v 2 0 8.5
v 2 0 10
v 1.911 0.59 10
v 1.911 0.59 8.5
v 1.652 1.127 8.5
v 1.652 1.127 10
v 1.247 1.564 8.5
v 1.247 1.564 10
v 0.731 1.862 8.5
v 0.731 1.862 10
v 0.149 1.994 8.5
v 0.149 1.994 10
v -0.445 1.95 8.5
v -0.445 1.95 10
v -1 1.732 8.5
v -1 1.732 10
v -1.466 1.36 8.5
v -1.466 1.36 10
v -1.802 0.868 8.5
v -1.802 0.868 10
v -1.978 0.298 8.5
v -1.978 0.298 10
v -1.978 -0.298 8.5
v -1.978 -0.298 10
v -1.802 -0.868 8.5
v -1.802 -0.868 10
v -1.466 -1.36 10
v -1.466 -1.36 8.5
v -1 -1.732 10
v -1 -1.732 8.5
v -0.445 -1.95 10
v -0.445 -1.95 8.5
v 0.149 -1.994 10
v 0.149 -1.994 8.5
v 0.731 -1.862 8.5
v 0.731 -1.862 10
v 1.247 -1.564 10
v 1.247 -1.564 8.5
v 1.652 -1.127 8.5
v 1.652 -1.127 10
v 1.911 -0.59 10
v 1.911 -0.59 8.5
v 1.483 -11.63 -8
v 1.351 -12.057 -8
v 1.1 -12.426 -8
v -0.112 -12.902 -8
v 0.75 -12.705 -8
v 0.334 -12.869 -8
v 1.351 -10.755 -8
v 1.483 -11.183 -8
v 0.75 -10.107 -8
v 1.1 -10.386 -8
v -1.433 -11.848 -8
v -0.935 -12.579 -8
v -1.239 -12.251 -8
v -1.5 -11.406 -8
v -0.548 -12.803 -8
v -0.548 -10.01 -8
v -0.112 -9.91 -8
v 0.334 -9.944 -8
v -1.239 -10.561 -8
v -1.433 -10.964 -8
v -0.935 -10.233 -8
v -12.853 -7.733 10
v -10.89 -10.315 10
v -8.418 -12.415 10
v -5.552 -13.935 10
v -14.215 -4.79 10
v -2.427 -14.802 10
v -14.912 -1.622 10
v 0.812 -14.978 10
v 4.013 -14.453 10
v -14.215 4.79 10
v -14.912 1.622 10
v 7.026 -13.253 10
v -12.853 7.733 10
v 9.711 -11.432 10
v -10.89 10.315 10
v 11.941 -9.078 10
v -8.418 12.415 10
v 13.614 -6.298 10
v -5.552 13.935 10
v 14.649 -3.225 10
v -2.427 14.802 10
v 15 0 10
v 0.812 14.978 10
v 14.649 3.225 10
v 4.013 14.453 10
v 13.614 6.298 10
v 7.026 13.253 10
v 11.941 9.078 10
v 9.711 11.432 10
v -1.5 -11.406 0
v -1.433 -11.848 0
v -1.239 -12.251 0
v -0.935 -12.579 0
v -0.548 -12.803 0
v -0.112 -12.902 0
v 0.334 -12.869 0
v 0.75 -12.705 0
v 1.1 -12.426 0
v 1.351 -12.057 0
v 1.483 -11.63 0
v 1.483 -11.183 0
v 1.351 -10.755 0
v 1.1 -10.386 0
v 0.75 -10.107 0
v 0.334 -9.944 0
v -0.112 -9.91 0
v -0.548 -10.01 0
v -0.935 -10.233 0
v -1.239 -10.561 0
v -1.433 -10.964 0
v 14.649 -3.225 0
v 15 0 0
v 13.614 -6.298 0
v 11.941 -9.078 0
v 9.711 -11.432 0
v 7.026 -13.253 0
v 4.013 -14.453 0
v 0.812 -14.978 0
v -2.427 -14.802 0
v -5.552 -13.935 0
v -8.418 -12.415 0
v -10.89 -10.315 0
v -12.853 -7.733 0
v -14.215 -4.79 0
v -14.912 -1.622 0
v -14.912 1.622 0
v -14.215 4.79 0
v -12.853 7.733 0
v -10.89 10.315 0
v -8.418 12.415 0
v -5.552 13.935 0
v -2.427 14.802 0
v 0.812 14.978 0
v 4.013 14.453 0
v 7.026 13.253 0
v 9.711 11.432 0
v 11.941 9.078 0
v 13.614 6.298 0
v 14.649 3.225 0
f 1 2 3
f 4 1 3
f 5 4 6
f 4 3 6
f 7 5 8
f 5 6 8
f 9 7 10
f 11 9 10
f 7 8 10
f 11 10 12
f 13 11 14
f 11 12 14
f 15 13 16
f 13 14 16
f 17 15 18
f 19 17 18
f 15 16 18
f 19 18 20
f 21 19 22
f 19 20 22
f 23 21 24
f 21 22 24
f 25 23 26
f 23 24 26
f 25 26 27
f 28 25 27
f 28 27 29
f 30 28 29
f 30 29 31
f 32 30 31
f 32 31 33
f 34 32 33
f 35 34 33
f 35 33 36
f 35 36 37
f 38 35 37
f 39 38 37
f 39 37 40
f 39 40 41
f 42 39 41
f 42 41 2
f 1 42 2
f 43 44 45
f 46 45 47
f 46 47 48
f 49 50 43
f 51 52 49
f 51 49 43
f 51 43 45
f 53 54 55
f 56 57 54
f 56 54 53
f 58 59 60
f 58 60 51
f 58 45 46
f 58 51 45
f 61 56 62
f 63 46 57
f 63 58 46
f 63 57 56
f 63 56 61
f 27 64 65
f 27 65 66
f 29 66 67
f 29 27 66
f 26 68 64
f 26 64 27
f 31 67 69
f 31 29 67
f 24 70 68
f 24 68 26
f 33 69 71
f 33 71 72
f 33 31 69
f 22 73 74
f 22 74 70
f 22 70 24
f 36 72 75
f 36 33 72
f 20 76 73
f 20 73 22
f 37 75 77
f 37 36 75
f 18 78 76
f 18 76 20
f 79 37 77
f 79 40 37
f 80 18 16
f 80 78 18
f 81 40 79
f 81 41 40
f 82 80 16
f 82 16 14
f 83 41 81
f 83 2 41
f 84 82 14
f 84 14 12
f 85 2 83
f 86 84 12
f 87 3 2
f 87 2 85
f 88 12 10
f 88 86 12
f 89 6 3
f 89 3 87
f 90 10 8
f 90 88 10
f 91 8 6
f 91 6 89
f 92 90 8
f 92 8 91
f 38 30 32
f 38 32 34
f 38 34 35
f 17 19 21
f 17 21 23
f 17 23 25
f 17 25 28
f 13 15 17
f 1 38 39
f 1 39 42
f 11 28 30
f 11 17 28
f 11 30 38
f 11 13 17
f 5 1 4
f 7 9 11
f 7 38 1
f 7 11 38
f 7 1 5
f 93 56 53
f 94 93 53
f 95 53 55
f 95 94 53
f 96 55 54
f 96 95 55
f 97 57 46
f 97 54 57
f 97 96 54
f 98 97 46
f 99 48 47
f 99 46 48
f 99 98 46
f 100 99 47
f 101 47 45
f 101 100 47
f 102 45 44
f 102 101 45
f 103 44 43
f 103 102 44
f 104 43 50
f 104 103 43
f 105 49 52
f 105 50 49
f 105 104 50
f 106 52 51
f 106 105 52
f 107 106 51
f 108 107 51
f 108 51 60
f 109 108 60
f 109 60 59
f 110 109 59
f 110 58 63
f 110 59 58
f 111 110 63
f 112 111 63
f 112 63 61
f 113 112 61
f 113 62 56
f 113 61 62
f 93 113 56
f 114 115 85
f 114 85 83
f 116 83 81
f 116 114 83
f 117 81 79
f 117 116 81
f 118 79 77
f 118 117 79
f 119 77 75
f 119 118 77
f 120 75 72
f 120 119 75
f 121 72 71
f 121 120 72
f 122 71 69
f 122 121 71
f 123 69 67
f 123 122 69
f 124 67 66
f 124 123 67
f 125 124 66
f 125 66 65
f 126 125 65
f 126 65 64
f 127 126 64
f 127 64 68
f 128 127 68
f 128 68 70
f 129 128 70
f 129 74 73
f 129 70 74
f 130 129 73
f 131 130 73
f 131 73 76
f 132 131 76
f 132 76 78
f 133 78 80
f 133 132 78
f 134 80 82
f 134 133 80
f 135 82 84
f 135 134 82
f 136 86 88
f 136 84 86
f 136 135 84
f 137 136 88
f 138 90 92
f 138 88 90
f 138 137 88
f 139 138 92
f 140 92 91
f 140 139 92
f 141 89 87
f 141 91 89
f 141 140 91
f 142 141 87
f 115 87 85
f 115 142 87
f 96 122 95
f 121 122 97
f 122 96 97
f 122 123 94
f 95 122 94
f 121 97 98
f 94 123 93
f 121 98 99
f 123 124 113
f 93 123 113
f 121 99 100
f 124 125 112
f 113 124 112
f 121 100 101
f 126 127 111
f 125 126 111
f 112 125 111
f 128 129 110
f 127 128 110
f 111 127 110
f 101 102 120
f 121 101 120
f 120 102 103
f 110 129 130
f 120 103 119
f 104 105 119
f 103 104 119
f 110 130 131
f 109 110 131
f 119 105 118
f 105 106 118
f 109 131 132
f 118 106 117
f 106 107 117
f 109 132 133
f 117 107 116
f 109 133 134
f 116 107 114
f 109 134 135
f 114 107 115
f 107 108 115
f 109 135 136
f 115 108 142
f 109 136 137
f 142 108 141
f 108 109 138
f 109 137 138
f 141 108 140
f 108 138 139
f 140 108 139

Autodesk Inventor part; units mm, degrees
ref_plane "YZ Plane" through (0, 0, 0) normal (1, 0, 0) x (0, 1, 0)
ref_plane "XZ Plane" through (0, 0, 0) normal (0, 1, 0) x (-1, 0, 0)
ref_plane "XY Plane" through (0, 0, 0) normal (0, 0, 1) x (1, 0, 0)
sketch "Sketch1" plane through (0, 0, 0) normal (0, 0, 1) x (1, 0, 0)
  circle A0 centre (0, 0) radius 15
  dimension "d0" = 30
extrude "Extrusion1" add sketch "Sketch1" along normal blind 10
sketch "Sketch2" plane through (0, 0, 10) normal (0, 0, 1) x (1, 0, 0)
  circle A0 centre (0, 0) radius 2
  dimension "d3" = 4
extrude "Extrusion2" cut sketch "Sketch2" against normal blind 1.5
sketch "Sketch3" plane through (0, 0, 0) normal (0, 0, -1) x (-1, 0, 0)
  circle A0 centre (0, -11.4062) radius 1.5
  point P0 (0, 0)
  dimension "d6" = 3
extrude "Extrusion3" add sketch "Sketch3" along normal blind 8
properties material "Water"
